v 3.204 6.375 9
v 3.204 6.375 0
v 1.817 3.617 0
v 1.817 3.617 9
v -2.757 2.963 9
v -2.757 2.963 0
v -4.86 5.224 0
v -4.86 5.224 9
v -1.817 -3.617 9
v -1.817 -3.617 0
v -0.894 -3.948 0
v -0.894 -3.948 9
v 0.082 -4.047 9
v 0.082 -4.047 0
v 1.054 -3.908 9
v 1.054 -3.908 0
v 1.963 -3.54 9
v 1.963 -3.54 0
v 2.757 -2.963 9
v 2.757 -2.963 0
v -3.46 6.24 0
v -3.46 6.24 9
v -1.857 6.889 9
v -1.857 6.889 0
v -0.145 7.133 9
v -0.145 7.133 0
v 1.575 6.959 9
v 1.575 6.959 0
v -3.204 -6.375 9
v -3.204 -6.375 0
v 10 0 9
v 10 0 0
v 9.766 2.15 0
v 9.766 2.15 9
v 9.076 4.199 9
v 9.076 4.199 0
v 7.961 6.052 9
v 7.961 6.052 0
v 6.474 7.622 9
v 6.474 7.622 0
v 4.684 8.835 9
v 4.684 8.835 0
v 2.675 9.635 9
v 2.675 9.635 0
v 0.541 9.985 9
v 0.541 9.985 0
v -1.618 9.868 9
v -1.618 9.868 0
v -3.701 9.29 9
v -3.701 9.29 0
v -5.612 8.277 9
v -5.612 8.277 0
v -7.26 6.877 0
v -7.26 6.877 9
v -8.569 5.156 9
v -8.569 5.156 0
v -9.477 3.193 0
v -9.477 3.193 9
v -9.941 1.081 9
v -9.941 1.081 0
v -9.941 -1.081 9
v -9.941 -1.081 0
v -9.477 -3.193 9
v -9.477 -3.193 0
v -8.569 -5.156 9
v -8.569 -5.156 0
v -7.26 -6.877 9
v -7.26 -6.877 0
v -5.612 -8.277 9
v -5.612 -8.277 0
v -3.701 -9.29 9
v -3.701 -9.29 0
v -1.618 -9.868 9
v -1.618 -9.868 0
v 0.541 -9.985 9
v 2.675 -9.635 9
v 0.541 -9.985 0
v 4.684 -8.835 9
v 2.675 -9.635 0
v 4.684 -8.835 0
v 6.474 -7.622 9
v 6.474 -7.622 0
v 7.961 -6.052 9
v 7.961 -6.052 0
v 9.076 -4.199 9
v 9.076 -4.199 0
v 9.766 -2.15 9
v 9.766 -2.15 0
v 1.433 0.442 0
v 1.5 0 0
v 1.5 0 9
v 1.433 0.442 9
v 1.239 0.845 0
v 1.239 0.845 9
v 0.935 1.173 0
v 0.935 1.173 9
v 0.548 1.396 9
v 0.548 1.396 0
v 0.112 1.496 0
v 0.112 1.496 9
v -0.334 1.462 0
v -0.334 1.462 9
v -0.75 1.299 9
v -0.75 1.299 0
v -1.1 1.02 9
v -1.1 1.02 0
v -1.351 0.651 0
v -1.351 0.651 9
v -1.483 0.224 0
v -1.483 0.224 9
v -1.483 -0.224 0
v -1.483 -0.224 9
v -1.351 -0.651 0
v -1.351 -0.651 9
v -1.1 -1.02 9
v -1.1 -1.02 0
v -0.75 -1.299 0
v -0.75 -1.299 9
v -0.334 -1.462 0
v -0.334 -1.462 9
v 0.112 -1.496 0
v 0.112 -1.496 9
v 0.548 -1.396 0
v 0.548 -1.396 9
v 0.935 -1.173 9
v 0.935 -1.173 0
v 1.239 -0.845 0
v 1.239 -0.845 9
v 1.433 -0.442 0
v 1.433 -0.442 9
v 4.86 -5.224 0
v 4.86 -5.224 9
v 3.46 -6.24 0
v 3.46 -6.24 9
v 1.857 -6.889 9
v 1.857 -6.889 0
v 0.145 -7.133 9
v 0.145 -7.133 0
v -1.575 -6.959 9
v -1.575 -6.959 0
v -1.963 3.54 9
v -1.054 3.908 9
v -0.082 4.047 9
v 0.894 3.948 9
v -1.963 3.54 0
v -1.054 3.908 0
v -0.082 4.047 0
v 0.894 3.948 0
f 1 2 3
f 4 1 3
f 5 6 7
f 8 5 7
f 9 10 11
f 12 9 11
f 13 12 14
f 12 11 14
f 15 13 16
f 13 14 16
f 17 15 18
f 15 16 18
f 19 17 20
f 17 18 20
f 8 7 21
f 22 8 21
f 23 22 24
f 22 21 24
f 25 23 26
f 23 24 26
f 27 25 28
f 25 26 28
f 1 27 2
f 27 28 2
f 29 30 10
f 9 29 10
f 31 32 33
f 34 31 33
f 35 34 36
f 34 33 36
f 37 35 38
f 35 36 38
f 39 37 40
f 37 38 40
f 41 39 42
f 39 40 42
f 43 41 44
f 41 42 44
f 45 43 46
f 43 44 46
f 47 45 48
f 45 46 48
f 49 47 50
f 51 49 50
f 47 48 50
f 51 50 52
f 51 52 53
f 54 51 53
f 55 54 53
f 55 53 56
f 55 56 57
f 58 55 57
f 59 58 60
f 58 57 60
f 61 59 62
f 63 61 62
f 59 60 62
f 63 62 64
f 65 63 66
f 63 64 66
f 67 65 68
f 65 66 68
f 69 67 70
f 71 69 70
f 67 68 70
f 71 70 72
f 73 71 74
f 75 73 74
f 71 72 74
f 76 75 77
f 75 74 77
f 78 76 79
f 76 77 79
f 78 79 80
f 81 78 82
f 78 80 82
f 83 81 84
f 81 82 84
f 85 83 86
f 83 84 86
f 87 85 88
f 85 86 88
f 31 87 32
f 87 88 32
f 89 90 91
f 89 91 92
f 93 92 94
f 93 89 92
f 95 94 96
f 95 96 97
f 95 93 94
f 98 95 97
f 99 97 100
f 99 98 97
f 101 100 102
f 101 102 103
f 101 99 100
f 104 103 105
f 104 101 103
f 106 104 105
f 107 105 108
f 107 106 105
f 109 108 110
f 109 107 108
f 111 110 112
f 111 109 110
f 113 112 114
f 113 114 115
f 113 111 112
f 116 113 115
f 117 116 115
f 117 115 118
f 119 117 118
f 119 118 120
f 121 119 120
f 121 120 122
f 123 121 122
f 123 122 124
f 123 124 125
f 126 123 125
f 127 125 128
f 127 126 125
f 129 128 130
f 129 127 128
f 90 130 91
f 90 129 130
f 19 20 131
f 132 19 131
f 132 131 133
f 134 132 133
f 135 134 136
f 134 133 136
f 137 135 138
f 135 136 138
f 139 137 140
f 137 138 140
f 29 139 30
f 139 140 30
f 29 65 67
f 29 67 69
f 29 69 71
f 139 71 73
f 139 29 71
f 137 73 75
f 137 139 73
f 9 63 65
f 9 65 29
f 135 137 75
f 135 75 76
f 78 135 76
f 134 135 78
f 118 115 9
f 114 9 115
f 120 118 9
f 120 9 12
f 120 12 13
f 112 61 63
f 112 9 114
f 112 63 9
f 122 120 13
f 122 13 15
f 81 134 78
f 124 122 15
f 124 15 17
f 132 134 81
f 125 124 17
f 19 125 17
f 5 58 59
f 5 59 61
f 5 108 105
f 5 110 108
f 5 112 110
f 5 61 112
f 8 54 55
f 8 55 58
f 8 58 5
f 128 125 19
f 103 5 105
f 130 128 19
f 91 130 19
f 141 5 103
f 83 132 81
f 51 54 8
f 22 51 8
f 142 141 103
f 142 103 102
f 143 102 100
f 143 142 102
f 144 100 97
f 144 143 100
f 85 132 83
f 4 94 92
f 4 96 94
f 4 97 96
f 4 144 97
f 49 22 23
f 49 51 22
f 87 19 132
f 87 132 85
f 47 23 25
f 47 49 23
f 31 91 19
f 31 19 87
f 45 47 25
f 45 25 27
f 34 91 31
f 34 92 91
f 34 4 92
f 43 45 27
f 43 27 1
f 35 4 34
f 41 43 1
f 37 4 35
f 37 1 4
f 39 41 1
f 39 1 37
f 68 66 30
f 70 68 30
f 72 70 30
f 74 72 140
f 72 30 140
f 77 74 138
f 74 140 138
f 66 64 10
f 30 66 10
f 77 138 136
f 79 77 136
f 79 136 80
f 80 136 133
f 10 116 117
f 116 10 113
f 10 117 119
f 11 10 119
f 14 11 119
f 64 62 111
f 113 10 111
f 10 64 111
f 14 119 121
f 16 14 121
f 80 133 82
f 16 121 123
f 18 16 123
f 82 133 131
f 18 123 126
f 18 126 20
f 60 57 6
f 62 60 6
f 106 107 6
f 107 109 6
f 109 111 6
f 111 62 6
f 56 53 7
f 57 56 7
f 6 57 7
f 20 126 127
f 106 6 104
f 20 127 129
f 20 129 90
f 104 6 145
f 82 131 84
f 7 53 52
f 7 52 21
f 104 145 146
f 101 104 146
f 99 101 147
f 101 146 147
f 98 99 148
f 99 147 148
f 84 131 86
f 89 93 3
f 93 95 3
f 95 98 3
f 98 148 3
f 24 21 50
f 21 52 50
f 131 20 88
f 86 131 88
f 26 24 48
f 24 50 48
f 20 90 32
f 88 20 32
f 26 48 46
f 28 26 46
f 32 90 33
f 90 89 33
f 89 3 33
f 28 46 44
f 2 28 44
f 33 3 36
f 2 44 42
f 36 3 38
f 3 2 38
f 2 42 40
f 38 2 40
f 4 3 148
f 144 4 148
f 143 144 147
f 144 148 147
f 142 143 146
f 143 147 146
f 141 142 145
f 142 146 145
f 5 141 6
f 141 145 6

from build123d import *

# Parameters (mm, degrees)
F0_R     = 10
F0_R_2   = 1.5
F1_DEPTH = 9


# Not quite as in the source:
# - a feature names something its author has since deleted; it is built from what else it names


with BuildPart() as f1:
    # F0 (on Top) → F1 (new body)
    with BuildSketch(Plane.XY):
        Circle(F0_R)
        with BuildLine():
            Line((-3.2035890311, -6.37527581), (-1.8173406245, -3.6165836534))
            ThreePointArc((-1.8173406245, -3.6165836534), (0.5722008428, -4.0068679119), (2.756987683, -2.9633466189))
            Line((2.756987683, -2.9633466189), (4.8599890306, -5.2237564028))
            ThreePointArc((4.8599890306, -5.2237564028), (1.0086696565, -7.0632648157), (-3.2035890311, -6.37527581))
        make_face(mode=Mode.SUBTRACT)
        with BuildLine():
            ThreePointArc((-4.8599890306, 5.2237564028), (-1.0086696565, 7.0632648157), (3.2035890311, 6.37527581))
            Line((3.2035890311, 6.37527581), (1.8173406245, 3.6165836534))
            ThreePointArc((1.8173406245, 3.6165836534), (-0.5722008428, 4.0068679119), (-2.756987683, 2.9633466189))
            Line((-2.756987683, 2.9633466189), (-4.8599890306, 5.2237564028))
        make_face(mode=Mode.SUBTRACT)
        Circle(F0_R_2, mode=Mode.SUBTRACT)
    extrude(amount=F1_DEPTH)


solid = f1.part
